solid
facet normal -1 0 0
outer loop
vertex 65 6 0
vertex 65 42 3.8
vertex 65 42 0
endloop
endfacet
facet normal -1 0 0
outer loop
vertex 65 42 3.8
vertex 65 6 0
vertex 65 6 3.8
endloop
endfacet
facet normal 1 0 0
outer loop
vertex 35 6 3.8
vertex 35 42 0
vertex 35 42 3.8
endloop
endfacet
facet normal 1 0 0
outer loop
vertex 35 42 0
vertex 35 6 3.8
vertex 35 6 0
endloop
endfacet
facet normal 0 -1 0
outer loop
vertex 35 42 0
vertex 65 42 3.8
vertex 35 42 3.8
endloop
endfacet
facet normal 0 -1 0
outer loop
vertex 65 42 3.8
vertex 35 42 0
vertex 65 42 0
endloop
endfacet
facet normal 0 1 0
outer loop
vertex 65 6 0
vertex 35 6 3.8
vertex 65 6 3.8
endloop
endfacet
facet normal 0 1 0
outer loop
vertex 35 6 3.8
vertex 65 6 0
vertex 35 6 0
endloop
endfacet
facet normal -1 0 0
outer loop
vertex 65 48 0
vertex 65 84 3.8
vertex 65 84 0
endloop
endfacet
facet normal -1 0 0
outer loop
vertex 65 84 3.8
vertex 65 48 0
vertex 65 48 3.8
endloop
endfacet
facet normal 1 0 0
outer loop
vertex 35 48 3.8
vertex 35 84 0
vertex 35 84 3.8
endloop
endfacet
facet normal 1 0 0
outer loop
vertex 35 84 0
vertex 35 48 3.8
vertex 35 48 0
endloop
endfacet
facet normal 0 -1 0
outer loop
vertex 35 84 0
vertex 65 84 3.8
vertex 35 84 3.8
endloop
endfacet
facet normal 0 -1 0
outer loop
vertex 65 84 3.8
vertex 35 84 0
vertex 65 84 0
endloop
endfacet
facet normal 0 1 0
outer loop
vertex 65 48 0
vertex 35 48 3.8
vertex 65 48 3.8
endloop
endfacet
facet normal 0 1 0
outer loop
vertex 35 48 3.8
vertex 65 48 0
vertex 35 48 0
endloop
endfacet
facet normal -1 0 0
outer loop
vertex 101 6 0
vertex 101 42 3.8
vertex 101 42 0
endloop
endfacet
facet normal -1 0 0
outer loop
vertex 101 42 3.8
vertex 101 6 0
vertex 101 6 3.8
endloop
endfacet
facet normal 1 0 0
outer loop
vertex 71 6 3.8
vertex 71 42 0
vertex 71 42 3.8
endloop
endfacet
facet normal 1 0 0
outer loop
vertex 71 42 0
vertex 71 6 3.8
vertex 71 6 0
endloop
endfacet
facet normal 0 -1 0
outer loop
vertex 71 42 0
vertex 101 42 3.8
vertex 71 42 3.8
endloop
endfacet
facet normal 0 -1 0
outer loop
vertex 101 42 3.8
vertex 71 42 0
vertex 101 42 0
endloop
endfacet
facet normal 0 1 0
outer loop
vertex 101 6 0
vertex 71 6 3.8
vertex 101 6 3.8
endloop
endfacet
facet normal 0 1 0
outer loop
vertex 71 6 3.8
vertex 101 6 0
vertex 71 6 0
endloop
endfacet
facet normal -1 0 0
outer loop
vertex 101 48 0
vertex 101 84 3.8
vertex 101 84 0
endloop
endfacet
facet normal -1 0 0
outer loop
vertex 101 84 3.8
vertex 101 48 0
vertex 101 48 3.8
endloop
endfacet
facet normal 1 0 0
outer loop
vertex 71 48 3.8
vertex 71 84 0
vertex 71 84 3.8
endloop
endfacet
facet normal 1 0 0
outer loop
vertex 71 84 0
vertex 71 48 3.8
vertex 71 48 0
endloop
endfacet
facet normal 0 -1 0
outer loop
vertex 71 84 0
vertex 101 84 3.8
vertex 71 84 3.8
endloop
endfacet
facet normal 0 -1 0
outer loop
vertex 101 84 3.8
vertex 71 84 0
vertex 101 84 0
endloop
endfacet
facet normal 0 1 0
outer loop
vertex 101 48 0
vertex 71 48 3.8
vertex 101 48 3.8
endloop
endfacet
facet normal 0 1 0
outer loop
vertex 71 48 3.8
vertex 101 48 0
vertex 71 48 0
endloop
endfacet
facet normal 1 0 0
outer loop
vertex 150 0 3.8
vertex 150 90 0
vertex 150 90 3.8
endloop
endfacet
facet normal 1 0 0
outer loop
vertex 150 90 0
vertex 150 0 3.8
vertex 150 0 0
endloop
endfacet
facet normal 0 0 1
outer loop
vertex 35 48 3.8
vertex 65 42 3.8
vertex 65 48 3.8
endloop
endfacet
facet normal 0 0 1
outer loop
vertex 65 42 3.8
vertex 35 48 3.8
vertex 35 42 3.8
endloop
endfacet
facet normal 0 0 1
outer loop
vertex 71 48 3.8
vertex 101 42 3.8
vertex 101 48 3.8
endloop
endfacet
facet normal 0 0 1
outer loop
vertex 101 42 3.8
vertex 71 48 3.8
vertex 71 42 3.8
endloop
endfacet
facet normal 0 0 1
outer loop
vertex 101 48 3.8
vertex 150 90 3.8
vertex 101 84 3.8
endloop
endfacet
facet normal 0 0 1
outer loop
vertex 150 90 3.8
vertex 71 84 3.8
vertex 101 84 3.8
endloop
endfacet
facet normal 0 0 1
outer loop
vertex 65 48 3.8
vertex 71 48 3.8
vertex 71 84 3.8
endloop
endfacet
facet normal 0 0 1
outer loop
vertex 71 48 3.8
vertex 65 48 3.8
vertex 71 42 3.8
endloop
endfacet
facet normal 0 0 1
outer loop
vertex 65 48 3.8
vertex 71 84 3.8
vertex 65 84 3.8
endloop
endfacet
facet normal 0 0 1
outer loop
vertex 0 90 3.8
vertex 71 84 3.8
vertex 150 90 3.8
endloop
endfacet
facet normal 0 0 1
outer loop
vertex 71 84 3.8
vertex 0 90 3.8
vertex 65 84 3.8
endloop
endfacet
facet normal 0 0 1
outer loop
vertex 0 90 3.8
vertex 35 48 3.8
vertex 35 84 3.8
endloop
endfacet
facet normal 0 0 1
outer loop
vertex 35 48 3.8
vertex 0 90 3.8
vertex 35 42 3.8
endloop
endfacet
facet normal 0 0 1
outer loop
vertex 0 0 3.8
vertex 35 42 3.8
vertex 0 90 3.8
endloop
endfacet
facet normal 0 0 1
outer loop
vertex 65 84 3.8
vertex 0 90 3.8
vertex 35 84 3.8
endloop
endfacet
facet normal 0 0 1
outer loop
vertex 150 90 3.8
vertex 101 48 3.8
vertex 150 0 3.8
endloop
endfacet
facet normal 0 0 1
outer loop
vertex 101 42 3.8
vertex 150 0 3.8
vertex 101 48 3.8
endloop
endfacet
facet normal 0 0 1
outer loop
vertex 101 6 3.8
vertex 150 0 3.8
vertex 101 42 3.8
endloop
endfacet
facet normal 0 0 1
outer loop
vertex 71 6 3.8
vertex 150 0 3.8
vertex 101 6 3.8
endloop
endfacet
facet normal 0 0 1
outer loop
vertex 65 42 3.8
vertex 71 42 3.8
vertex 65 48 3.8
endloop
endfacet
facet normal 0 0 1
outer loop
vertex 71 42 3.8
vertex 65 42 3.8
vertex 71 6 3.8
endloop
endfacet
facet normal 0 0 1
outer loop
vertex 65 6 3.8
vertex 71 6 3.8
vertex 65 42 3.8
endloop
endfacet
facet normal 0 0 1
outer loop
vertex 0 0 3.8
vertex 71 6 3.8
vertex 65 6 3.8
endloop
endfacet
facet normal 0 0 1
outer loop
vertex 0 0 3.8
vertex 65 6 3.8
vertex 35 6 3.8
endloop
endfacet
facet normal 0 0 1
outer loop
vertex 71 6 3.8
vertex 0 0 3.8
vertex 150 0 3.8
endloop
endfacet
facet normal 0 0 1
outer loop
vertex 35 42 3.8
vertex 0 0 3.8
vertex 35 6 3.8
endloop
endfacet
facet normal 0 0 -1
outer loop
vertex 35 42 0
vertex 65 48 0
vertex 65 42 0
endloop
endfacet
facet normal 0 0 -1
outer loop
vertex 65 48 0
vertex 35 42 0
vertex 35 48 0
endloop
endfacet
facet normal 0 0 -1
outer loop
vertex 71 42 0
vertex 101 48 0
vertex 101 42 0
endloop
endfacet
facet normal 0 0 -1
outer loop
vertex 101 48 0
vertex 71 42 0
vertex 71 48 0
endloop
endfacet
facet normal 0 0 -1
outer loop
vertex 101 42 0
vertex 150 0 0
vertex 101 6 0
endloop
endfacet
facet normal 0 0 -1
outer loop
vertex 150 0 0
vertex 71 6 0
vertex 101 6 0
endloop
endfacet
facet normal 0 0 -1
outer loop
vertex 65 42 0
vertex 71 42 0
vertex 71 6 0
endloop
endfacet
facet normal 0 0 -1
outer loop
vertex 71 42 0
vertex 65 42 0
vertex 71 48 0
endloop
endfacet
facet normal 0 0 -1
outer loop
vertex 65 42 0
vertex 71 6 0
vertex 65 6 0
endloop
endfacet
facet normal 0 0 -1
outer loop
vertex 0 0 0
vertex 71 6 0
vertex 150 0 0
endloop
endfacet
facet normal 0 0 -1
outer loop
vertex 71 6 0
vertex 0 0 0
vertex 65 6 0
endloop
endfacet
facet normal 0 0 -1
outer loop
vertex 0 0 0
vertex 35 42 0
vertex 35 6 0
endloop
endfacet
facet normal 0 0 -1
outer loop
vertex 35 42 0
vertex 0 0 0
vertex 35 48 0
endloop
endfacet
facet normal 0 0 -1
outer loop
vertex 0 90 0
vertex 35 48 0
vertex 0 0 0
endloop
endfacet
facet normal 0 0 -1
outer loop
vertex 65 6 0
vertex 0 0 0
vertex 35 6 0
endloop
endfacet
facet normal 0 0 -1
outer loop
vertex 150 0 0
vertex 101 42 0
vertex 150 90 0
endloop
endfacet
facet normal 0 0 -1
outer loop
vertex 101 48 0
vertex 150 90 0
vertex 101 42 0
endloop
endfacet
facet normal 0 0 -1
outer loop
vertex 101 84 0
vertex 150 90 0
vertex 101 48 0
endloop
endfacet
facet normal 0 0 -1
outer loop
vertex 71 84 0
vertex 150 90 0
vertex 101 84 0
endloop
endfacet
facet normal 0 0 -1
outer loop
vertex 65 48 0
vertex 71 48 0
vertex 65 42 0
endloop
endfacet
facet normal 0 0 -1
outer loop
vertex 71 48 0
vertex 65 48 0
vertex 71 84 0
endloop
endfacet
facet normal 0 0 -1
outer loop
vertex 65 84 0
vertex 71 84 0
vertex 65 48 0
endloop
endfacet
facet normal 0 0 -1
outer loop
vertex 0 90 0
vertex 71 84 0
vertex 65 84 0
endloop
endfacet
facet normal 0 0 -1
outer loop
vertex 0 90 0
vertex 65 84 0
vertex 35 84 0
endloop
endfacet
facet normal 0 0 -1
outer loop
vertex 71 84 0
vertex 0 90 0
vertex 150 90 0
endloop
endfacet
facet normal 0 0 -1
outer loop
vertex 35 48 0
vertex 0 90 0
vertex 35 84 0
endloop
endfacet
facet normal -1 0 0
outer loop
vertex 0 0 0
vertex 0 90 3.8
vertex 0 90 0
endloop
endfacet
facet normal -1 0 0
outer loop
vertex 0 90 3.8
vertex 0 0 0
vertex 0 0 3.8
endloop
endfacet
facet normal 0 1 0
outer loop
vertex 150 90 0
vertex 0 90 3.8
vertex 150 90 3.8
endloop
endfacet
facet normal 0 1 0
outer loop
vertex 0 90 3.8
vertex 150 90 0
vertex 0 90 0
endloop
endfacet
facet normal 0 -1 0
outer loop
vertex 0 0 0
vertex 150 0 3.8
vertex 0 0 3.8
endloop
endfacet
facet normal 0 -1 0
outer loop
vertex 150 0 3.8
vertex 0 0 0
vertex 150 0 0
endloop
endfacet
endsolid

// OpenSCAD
// Mail envelope core, rev C (2026-10-28), all PLA, units mm. Generated by
// make_envelope_core.py, the same dimensions as envelope_core.stl.
// Origin = the near-edge / right-edge corner of the bottom face. x from the NEAR
// edge (the jaws grip it) to the FAR end (lies on the hat, enters the mailbox
// first); y across from the right long edge; z up.
L = 150.0; W = 90.0; T = 3.8;
GRIP = 35.0;                      // solid grip band from the near edge
HOLE = [30.0, 36.0];               // each through-window, x by y
WEB = 6.0; NX = 2; NY = 2;    // window grid; the webs between and round them
// the far band is what is left: L - GRIP - NX*HOLE[0] - (NX-1)*WEB = 49.0

difference() {
    cube([L, W, T]);
    for (i = [0 : NX - 1], j = [0 : NY - 1])
        translate([GRIP + i * (HOLE[0] + WEB), WEB + j * (HOLE[1] + WEB), -1])
            cube([HOLE[0], HOLE[1], T + 2]);
}
